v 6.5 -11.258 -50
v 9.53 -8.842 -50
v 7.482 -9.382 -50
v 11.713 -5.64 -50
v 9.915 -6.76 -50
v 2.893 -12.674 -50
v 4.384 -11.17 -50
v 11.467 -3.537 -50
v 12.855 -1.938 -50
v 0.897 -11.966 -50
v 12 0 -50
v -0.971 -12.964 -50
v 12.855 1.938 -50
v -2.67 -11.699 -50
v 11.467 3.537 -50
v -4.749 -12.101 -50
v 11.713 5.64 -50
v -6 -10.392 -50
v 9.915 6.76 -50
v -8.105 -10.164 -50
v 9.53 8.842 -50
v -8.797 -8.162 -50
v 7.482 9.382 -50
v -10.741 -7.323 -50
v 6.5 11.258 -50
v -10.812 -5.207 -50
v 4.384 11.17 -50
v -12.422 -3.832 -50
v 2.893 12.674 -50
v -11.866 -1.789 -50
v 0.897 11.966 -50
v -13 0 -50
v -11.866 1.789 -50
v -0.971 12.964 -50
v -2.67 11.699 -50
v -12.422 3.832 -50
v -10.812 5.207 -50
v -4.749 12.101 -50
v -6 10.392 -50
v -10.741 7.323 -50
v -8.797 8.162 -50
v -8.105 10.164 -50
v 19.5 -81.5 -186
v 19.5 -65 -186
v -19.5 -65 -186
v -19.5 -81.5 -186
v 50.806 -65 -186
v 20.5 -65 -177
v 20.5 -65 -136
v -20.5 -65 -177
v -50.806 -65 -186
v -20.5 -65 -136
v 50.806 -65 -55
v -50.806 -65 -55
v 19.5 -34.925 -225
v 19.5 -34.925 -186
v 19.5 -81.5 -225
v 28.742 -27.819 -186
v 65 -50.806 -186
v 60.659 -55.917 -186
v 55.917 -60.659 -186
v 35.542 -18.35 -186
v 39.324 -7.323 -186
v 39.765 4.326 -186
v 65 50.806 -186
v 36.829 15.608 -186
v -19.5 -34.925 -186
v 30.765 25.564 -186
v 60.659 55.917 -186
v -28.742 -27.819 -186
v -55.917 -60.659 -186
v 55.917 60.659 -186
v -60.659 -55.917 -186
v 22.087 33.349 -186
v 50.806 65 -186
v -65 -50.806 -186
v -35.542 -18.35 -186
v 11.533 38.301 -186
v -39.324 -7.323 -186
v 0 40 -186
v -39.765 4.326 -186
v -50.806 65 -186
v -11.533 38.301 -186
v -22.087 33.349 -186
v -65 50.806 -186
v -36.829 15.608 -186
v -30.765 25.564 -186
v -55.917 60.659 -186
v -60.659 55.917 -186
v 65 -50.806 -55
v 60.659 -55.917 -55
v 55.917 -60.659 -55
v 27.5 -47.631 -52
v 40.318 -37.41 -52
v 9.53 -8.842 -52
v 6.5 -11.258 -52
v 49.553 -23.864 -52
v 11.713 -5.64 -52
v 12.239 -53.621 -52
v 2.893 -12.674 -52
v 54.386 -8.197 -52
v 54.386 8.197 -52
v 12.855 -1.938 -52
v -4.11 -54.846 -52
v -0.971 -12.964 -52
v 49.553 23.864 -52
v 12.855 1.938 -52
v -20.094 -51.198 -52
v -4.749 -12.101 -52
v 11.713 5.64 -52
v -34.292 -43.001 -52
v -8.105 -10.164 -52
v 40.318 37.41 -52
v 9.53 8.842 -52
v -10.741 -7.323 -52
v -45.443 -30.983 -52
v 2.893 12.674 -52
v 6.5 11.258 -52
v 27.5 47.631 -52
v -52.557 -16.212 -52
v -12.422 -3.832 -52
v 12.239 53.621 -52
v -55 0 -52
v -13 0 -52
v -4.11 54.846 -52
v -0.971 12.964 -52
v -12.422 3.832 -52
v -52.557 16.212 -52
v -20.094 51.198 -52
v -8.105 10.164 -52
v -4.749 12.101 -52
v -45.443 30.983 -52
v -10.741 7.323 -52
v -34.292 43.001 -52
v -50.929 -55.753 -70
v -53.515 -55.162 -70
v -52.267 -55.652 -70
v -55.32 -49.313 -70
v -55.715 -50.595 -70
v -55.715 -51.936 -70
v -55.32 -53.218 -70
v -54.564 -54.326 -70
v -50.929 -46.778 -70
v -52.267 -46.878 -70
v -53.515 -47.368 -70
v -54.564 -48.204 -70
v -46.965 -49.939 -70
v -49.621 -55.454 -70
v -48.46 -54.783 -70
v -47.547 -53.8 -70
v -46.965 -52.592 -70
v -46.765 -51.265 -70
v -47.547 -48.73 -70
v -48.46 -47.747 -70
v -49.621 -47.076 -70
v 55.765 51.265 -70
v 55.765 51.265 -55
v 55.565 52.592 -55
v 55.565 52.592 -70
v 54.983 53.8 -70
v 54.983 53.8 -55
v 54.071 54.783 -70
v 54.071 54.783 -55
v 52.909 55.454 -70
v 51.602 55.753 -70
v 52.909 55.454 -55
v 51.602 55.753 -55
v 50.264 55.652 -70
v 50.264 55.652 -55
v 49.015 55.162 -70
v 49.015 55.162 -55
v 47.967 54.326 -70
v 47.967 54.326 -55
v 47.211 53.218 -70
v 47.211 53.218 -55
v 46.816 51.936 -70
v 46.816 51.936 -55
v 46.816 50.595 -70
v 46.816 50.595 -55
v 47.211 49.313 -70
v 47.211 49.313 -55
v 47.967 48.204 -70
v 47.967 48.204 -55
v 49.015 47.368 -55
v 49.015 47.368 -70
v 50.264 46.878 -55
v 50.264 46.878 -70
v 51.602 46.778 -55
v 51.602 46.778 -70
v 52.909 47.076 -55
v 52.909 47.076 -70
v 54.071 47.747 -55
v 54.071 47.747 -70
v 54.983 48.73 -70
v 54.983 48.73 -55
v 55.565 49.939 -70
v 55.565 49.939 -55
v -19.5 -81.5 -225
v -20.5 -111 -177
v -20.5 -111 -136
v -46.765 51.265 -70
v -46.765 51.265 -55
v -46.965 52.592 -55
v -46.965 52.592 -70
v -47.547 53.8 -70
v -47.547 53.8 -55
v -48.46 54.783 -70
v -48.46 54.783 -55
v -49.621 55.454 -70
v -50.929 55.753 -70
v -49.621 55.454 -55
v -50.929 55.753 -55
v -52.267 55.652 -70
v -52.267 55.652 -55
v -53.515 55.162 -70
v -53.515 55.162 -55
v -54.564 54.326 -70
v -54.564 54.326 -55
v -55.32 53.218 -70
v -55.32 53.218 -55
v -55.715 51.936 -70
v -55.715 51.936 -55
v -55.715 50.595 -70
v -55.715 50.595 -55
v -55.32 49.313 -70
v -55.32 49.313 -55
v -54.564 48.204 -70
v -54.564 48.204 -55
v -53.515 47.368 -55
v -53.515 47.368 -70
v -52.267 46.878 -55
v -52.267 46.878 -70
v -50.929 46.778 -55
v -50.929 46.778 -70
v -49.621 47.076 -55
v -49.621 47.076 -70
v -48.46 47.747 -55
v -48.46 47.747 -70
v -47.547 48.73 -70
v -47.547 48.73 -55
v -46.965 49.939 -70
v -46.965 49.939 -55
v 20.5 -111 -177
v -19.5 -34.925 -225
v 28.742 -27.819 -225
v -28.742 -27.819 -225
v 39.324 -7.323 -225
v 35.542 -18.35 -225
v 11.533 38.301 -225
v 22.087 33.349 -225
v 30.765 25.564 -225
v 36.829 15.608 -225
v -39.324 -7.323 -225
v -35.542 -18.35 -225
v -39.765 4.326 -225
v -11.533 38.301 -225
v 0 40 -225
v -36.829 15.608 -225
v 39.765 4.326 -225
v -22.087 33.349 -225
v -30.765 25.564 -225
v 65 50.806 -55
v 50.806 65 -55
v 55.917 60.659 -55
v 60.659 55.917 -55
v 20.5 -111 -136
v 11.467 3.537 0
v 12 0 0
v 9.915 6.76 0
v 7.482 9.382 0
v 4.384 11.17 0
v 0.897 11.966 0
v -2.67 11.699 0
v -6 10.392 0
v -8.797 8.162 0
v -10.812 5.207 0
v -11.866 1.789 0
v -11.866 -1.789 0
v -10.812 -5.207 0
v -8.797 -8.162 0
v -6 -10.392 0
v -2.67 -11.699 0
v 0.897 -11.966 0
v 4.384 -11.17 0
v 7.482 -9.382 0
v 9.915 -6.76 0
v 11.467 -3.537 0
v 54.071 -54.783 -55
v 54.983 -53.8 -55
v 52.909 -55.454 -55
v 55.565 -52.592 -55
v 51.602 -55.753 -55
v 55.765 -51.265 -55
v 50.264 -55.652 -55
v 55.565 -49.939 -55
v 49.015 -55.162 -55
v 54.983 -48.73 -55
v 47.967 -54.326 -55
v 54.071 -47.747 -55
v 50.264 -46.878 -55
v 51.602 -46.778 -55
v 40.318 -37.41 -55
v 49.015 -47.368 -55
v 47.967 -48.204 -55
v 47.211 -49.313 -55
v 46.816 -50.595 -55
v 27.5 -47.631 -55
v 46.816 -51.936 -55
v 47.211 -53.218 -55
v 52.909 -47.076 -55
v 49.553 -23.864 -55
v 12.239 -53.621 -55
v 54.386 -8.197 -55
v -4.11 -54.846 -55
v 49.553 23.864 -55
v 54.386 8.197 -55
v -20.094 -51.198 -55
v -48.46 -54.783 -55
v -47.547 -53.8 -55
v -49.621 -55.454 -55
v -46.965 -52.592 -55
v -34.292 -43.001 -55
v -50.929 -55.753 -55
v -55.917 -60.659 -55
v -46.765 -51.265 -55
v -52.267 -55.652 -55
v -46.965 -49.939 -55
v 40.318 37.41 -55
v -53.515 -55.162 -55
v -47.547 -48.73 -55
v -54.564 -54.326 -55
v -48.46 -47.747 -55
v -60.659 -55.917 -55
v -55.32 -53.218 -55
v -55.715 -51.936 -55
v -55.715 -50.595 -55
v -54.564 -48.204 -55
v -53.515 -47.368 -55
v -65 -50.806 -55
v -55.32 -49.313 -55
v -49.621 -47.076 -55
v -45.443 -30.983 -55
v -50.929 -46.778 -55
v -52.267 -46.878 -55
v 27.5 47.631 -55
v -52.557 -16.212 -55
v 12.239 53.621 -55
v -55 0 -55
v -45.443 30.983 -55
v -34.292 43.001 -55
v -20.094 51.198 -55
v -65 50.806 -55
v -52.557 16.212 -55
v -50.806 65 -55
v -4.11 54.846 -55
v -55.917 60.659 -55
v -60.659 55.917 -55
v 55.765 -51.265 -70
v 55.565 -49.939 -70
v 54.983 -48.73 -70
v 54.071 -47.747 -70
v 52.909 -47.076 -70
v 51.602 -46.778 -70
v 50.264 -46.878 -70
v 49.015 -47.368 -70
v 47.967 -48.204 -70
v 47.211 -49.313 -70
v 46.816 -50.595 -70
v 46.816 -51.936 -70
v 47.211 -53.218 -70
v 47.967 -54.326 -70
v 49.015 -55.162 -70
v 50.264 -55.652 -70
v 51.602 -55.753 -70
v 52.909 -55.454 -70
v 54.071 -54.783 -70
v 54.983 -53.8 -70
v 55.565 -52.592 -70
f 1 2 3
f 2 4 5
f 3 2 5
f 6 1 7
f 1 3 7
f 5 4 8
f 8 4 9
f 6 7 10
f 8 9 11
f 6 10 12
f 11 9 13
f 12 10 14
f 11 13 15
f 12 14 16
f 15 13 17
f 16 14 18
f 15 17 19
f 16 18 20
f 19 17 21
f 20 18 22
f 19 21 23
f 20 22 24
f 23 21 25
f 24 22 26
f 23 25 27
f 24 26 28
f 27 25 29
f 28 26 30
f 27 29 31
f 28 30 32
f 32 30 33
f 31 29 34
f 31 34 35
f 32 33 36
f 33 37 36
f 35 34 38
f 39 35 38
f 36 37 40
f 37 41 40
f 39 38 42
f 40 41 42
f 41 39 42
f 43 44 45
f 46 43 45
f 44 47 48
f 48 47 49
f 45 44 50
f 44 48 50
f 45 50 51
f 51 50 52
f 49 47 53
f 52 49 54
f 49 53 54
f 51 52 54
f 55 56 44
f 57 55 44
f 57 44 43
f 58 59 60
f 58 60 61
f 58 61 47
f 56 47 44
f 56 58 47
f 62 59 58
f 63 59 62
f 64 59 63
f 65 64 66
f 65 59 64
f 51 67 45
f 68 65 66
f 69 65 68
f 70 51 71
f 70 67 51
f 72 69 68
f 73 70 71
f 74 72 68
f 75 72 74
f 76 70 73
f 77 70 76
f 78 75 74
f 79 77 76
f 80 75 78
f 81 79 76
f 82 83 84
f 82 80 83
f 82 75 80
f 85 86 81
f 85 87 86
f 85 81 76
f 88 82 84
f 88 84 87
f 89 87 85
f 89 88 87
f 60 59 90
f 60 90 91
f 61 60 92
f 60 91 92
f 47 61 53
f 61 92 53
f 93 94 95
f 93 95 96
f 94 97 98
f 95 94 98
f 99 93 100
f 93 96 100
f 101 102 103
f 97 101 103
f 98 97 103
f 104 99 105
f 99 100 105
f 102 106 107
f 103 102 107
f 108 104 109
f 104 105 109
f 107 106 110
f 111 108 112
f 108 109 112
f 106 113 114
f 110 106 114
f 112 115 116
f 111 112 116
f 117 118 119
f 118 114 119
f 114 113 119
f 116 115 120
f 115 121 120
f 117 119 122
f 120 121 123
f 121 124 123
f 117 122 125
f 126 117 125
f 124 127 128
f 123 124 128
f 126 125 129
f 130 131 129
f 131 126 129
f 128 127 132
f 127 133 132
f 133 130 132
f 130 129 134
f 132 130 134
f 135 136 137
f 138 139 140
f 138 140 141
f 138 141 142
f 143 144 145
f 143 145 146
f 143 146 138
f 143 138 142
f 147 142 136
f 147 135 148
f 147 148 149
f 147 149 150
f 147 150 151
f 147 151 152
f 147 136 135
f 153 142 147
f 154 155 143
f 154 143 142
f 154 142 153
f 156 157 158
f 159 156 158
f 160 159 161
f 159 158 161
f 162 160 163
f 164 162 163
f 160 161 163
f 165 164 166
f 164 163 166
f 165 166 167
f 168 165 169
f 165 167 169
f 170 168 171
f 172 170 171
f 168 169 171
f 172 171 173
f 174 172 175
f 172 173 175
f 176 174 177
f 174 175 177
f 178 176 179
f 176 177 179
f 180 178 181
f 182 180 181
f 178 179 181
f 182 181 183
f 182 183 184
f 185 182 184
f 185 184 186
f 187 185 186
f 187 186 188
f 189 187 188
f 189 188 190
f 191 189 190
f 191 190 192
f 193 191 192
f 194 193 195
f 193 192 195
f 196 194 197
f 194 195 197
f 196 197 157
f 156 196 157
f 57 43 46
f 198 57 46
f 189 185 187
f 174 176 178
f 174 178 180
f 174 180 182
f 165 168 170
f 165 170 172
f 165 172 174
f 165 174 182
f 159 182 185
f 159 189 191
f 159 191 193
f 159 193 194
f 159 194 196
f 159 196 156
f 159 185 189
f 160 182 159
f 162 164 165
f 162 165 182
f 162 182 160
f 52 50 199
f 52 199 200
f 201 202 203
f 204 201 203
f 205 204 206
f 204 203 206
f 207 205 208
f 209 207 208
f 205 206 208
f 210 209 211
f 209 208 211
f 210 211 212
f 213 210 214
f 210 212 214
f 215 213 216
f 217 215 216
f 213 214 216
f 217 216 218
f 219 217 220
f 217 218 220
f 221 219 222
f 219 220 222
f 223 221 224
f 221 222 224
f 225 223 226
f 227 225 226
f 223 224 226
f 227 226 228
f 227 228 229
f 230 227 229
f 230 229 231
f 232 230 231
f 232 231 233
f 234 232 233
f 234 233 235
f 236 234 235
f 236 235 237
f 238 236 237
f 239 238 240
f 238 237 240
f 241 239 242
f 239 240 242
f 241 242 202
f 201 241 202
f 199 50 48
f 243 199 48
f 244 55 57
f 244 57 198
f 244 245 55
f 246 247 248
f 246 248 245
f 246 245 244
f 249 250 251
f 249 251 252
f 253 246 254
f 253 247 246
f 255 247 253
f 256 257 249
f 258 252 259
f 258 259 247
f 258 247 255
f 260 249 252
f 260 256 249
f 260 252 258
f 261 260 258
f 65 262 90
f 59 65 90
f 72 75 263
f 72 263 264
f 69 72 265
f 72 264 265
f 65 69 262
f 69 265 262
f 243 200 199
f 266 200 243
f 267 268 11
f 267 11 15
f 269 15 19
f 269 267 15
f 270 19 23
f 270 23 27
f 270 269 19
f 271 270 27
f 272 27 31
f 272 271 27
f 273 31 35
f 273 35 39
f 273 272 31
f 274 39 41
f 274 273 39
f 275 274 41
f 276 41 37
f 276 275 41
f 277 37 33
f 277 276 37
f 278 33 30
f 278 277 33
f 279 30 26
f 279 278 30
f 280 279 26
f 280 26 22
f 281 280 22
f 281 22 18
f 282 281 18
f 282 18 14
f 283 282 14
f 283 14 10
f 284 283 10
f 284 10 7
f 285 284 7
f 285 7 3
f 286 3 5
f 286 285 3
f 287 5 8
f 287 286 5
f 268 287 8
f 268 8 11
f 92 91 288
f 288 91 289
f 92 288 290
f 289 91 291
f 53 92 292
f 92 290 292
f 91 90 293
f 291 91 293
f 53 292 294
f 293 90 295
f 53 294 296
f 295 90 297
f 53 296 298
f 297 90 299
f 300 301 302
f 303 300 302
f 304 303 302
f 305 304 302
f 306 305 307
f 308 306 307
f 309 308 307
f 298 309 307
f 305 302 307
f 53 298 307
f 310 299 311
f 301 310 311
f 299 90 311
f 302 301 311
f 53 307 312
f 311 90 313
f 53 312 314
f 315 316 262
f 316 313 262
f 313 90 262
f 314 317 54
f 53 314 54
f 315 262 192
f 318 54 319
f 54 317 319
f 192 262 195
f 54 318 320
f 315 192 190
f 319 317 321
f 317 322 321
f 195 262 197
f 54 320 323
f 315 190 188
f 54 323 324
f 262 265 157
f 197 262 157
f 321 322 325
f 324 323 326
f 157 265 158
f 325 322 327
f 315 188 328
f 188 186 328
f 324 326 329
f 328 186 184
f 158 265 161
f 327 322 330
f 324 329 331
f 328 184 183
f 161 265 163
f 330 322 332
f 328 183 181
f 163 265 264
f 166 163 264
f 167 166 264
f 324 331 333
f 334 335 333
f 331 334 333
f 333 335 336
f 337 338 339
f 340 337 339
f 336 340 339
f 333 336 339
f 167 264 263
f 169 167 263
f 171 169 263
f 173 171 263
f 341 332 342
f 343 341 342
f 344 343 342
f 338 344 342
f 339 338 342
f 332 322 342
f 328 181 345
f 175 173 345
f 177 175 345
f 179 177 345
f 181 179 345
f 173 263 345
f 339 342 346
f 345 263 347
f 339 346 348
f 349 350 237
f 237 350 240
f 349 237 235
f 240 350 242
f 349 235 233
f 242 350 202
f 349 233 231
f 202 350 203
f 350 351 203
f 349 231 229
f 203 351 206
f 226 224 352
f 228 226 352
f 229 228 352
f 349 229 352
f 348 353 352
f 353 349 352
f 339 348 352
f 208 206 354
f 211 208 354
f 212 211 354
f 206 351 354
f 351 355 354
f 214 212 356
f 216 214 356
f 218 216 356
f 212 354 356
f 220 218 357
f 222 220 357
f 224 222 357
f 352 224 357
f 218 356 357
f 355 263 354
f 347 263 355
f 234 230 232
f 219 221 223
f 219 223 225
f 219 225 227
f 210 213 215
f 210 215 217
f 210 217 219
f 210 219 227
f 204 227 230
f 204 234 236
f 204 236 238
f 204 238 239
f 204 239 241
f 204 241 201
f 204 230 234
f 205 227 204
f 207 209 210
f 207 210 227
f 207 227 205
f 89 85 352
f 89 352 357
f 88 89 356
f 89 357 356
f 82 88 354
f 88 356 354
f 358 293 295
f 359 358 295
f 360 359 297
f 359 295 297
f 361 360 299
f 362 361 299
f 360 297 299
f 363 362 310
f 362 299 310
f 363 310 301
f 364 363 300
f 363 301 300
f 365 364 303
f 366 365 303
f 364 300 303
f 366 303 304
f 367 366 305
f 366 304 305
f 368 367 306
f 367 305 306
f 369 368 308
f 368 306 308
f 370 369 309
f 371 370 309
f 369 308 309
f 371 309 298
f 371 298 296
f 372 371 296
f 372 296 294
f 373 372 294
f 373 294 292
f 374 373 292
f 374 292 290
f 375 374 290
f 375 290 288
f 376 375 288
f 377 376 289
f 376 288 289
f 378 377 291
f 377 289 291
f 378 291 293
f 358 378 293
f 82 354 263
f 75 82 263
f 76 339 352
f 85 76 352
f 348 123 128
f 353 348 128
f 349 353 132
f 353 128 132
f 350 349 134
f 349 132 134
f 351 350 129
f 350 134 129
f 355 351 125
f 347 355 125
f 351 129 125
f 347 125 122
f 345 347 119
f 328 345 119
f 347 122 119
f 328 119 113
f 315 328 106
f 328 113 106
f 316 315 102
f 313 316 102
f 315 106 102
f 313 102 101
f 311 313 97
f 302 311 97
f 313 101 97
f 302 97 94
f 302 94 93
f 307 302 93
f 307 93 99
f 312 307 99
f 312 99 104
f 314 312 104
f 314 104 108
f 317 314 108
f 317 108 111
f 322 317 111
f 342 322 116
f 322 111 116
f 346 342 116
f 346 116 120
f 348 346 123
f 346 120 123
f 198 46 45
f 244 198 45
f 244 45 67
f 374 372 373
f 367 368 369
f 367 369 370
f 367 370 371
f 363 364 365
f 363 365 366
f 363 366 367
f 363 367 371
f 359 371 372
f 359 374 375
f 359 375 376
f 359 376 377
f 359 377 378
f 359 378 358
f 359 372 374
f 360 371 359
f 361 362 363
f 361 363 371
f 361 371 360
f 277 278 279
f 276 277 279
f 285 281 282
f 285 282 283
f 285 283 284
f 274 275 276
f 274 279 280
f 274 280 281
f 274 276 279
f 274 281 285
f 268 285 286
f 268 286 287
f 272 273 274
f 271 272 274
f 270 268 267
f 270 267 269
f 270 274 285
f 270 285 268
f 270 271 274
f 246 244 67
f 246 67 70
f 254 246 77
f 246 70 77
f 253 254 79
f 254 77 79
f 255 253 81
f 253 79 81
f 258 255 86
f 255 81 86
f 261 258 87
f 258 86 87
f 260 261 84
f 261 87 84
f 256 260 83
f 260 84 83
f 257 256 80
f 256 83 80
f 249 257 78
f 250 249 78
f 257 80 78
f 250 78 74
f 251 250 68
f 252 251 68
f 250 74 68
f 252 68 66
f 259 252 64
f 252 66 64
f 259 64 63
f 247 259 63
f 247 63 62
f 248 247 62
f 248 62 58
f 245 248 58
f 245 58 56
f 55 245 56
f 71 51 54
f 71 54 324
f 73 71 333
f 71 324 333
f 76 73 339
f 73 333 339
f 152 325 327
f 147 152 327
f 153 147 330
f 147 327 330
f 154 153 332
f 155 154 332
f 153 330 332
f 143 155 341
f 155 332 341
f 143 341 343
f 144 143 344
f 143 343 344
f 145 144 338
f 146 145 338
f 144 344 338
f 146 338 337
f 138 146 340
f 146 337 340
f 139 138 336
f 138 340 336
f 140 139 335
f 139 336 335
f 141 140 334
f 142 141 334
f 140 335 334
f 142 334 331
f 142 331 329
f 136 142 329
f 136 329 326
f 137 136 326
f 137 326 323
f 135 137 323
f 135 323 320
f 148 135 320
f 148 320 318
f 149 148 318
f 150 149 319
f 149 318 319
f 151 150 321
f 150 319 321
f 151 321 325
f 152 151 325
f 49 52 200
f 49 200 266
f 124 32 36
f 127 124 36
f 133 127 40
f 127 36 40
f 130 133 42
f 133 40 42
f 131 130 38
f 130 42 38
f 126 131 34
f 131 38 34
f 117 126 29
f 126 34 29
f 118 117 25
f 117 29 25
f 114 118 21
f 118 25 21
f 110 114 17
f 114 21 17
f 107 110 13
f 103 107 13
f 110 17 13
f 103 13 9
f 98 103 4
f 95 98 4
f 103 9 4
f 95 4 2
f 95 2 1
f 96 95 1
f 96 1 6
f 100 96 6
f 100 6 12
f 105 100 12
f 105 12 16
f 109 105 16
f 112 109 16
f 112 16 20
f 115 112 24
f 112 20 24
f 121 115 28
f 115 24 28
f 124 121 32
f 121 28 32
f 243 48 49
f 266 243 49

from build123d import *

# Parameters (mm, degrees)
SKETCH1_R           = 12
BOSS_EXTRUDE1_DEPTH = 50
SKETCH2_R           = 13
BOSS_EXTRUDE2_DEPTH = 2
SKETCH3_R           = 55
BOSS_EXTRUDE3_DEPTH = 3
BOSS_EXTRUDE4_DEPTH = 131
BOSS_EXTRUDE5_DEPTH = 39
SKETCH6_R           = 4.5
CUT_EXTRUDE1_DEPTH  = 15
SKETCH7_W           = 41
SKETCH7_H           = 41
BOSS_EXTRUDE6_DEPTH = 46


with BuildPart() as part:
    # Sketch1 → Boss-Extrude1 (new body)
    with BuildSketch(Plane.XY):
        Circle(SKETCH1_R)
    extrude(amount=-BOSS_EXTRUDE1_DEPTH)

    # Sketch2 → Boss-Extrude2 (add)
    with BuildSketch(Plane(origin=(0, 0, -50), x_dir=(-1, 0, 0), z_dir=(0, 0, -1))):
        Circle(SKETCH2_R)
    extrude(amount=BOSS_EXTRUDE2_DEPTH)

    # Sketch3 → Boss-Extrude3 (add)
    with BuildSketch(Plane(origin=(0, 0, -52), x_dir=(-1, 0, 0), z_dir=(0, 0, -1))):
        Circle(SKETCH3_R)
    extrude(amount=BOSS_EXTRUDE3_DEPTH)

    # Sketch4 → Boss-Extrude4 (add)
    with BuildSketch(Plane(origin=(0, 0, -55), x_dir=(-1, 0, 0), z_dir=(0, 0, -1))):
        with BuildLine():
            Line((-50.806003582, -65), (50.806003582, -65))
            ThreePointArc((50.806003582, -65), (58.336309448, -58.336309448), (65, -50.806003582))
            Line((65, -50.806003582), (65, 50.806003582))
            ThreePointArc((65, 50.806003582), (58.336309448, 58.336309448), (50.806003582, 65))
            Line((50.806003582, 65), (-50.806003582, 65))
            ThreePointArc((-50.806003582, 65), (-58.336309448, 58.336309448), (-65, 50.806003582))
            Line((-65, 50.806003582), (-65, -50.806003582))
            ThreePointArc((-65, -50.806003582), (-58.336309448, -58.336309448), (-50.806003582, -65))
        make_face()
    extrude(amount=BOSS_EXTRUDE4_DEPTH)

    # Sketch5 → Boss-Extrude5 (add)
    with BuildSketch(Plane(origin=(0, 0, -186), x_dir=(-1, 0, 0), z_dir=(0, 0, -1))):
        with BuildLine():
            Line((-19.5, -34.92491947), (-19.5, -81.5))
            Line((-19.5, -81.5), (19.5, -81.5))
            Line((19.5, -81.5), (19.5, -34.92491947))
            ThreePointArc((19.5, -34.92491947), (0, 40), (-19.5, -34.92491947))
        make_face()
    extrude(amount=BOSS_EXTRUDE5_DEPTH)

    # Sketch6 → Cut-Extrude1 (cut)
    with BuildSketch(Plane.XY.offset(-55)):
        with Locations((-51.265241636, 51.265241636)):
            Circle(SKETCH6_R)
        with Locations((51.265241636, 51.265241636)):
            Circle(SKETCH6_R)
        with Locations((51.265241636, -51.265241636)):
            Circle(SKETCH6_R)
        with Locations((-51.265241636, -51.265241636)):
            Circle(SKETCH6_R)
    extrude(amount=-CUT_EXTRUDE1_DEPTH, mode=Mode.SUBTRACT)

    # Sketch7 → Boss-Extrude6 (add)
    with BuildSketch(Plane.XZ.offset(65)):
        with Locations((0, -156.5)):
            Rectangle(SKETCH7_W, SKETCH7_H)
    extrude(amount=BOSS_EXTRUDE6_DEPTH)


solid = part.part
